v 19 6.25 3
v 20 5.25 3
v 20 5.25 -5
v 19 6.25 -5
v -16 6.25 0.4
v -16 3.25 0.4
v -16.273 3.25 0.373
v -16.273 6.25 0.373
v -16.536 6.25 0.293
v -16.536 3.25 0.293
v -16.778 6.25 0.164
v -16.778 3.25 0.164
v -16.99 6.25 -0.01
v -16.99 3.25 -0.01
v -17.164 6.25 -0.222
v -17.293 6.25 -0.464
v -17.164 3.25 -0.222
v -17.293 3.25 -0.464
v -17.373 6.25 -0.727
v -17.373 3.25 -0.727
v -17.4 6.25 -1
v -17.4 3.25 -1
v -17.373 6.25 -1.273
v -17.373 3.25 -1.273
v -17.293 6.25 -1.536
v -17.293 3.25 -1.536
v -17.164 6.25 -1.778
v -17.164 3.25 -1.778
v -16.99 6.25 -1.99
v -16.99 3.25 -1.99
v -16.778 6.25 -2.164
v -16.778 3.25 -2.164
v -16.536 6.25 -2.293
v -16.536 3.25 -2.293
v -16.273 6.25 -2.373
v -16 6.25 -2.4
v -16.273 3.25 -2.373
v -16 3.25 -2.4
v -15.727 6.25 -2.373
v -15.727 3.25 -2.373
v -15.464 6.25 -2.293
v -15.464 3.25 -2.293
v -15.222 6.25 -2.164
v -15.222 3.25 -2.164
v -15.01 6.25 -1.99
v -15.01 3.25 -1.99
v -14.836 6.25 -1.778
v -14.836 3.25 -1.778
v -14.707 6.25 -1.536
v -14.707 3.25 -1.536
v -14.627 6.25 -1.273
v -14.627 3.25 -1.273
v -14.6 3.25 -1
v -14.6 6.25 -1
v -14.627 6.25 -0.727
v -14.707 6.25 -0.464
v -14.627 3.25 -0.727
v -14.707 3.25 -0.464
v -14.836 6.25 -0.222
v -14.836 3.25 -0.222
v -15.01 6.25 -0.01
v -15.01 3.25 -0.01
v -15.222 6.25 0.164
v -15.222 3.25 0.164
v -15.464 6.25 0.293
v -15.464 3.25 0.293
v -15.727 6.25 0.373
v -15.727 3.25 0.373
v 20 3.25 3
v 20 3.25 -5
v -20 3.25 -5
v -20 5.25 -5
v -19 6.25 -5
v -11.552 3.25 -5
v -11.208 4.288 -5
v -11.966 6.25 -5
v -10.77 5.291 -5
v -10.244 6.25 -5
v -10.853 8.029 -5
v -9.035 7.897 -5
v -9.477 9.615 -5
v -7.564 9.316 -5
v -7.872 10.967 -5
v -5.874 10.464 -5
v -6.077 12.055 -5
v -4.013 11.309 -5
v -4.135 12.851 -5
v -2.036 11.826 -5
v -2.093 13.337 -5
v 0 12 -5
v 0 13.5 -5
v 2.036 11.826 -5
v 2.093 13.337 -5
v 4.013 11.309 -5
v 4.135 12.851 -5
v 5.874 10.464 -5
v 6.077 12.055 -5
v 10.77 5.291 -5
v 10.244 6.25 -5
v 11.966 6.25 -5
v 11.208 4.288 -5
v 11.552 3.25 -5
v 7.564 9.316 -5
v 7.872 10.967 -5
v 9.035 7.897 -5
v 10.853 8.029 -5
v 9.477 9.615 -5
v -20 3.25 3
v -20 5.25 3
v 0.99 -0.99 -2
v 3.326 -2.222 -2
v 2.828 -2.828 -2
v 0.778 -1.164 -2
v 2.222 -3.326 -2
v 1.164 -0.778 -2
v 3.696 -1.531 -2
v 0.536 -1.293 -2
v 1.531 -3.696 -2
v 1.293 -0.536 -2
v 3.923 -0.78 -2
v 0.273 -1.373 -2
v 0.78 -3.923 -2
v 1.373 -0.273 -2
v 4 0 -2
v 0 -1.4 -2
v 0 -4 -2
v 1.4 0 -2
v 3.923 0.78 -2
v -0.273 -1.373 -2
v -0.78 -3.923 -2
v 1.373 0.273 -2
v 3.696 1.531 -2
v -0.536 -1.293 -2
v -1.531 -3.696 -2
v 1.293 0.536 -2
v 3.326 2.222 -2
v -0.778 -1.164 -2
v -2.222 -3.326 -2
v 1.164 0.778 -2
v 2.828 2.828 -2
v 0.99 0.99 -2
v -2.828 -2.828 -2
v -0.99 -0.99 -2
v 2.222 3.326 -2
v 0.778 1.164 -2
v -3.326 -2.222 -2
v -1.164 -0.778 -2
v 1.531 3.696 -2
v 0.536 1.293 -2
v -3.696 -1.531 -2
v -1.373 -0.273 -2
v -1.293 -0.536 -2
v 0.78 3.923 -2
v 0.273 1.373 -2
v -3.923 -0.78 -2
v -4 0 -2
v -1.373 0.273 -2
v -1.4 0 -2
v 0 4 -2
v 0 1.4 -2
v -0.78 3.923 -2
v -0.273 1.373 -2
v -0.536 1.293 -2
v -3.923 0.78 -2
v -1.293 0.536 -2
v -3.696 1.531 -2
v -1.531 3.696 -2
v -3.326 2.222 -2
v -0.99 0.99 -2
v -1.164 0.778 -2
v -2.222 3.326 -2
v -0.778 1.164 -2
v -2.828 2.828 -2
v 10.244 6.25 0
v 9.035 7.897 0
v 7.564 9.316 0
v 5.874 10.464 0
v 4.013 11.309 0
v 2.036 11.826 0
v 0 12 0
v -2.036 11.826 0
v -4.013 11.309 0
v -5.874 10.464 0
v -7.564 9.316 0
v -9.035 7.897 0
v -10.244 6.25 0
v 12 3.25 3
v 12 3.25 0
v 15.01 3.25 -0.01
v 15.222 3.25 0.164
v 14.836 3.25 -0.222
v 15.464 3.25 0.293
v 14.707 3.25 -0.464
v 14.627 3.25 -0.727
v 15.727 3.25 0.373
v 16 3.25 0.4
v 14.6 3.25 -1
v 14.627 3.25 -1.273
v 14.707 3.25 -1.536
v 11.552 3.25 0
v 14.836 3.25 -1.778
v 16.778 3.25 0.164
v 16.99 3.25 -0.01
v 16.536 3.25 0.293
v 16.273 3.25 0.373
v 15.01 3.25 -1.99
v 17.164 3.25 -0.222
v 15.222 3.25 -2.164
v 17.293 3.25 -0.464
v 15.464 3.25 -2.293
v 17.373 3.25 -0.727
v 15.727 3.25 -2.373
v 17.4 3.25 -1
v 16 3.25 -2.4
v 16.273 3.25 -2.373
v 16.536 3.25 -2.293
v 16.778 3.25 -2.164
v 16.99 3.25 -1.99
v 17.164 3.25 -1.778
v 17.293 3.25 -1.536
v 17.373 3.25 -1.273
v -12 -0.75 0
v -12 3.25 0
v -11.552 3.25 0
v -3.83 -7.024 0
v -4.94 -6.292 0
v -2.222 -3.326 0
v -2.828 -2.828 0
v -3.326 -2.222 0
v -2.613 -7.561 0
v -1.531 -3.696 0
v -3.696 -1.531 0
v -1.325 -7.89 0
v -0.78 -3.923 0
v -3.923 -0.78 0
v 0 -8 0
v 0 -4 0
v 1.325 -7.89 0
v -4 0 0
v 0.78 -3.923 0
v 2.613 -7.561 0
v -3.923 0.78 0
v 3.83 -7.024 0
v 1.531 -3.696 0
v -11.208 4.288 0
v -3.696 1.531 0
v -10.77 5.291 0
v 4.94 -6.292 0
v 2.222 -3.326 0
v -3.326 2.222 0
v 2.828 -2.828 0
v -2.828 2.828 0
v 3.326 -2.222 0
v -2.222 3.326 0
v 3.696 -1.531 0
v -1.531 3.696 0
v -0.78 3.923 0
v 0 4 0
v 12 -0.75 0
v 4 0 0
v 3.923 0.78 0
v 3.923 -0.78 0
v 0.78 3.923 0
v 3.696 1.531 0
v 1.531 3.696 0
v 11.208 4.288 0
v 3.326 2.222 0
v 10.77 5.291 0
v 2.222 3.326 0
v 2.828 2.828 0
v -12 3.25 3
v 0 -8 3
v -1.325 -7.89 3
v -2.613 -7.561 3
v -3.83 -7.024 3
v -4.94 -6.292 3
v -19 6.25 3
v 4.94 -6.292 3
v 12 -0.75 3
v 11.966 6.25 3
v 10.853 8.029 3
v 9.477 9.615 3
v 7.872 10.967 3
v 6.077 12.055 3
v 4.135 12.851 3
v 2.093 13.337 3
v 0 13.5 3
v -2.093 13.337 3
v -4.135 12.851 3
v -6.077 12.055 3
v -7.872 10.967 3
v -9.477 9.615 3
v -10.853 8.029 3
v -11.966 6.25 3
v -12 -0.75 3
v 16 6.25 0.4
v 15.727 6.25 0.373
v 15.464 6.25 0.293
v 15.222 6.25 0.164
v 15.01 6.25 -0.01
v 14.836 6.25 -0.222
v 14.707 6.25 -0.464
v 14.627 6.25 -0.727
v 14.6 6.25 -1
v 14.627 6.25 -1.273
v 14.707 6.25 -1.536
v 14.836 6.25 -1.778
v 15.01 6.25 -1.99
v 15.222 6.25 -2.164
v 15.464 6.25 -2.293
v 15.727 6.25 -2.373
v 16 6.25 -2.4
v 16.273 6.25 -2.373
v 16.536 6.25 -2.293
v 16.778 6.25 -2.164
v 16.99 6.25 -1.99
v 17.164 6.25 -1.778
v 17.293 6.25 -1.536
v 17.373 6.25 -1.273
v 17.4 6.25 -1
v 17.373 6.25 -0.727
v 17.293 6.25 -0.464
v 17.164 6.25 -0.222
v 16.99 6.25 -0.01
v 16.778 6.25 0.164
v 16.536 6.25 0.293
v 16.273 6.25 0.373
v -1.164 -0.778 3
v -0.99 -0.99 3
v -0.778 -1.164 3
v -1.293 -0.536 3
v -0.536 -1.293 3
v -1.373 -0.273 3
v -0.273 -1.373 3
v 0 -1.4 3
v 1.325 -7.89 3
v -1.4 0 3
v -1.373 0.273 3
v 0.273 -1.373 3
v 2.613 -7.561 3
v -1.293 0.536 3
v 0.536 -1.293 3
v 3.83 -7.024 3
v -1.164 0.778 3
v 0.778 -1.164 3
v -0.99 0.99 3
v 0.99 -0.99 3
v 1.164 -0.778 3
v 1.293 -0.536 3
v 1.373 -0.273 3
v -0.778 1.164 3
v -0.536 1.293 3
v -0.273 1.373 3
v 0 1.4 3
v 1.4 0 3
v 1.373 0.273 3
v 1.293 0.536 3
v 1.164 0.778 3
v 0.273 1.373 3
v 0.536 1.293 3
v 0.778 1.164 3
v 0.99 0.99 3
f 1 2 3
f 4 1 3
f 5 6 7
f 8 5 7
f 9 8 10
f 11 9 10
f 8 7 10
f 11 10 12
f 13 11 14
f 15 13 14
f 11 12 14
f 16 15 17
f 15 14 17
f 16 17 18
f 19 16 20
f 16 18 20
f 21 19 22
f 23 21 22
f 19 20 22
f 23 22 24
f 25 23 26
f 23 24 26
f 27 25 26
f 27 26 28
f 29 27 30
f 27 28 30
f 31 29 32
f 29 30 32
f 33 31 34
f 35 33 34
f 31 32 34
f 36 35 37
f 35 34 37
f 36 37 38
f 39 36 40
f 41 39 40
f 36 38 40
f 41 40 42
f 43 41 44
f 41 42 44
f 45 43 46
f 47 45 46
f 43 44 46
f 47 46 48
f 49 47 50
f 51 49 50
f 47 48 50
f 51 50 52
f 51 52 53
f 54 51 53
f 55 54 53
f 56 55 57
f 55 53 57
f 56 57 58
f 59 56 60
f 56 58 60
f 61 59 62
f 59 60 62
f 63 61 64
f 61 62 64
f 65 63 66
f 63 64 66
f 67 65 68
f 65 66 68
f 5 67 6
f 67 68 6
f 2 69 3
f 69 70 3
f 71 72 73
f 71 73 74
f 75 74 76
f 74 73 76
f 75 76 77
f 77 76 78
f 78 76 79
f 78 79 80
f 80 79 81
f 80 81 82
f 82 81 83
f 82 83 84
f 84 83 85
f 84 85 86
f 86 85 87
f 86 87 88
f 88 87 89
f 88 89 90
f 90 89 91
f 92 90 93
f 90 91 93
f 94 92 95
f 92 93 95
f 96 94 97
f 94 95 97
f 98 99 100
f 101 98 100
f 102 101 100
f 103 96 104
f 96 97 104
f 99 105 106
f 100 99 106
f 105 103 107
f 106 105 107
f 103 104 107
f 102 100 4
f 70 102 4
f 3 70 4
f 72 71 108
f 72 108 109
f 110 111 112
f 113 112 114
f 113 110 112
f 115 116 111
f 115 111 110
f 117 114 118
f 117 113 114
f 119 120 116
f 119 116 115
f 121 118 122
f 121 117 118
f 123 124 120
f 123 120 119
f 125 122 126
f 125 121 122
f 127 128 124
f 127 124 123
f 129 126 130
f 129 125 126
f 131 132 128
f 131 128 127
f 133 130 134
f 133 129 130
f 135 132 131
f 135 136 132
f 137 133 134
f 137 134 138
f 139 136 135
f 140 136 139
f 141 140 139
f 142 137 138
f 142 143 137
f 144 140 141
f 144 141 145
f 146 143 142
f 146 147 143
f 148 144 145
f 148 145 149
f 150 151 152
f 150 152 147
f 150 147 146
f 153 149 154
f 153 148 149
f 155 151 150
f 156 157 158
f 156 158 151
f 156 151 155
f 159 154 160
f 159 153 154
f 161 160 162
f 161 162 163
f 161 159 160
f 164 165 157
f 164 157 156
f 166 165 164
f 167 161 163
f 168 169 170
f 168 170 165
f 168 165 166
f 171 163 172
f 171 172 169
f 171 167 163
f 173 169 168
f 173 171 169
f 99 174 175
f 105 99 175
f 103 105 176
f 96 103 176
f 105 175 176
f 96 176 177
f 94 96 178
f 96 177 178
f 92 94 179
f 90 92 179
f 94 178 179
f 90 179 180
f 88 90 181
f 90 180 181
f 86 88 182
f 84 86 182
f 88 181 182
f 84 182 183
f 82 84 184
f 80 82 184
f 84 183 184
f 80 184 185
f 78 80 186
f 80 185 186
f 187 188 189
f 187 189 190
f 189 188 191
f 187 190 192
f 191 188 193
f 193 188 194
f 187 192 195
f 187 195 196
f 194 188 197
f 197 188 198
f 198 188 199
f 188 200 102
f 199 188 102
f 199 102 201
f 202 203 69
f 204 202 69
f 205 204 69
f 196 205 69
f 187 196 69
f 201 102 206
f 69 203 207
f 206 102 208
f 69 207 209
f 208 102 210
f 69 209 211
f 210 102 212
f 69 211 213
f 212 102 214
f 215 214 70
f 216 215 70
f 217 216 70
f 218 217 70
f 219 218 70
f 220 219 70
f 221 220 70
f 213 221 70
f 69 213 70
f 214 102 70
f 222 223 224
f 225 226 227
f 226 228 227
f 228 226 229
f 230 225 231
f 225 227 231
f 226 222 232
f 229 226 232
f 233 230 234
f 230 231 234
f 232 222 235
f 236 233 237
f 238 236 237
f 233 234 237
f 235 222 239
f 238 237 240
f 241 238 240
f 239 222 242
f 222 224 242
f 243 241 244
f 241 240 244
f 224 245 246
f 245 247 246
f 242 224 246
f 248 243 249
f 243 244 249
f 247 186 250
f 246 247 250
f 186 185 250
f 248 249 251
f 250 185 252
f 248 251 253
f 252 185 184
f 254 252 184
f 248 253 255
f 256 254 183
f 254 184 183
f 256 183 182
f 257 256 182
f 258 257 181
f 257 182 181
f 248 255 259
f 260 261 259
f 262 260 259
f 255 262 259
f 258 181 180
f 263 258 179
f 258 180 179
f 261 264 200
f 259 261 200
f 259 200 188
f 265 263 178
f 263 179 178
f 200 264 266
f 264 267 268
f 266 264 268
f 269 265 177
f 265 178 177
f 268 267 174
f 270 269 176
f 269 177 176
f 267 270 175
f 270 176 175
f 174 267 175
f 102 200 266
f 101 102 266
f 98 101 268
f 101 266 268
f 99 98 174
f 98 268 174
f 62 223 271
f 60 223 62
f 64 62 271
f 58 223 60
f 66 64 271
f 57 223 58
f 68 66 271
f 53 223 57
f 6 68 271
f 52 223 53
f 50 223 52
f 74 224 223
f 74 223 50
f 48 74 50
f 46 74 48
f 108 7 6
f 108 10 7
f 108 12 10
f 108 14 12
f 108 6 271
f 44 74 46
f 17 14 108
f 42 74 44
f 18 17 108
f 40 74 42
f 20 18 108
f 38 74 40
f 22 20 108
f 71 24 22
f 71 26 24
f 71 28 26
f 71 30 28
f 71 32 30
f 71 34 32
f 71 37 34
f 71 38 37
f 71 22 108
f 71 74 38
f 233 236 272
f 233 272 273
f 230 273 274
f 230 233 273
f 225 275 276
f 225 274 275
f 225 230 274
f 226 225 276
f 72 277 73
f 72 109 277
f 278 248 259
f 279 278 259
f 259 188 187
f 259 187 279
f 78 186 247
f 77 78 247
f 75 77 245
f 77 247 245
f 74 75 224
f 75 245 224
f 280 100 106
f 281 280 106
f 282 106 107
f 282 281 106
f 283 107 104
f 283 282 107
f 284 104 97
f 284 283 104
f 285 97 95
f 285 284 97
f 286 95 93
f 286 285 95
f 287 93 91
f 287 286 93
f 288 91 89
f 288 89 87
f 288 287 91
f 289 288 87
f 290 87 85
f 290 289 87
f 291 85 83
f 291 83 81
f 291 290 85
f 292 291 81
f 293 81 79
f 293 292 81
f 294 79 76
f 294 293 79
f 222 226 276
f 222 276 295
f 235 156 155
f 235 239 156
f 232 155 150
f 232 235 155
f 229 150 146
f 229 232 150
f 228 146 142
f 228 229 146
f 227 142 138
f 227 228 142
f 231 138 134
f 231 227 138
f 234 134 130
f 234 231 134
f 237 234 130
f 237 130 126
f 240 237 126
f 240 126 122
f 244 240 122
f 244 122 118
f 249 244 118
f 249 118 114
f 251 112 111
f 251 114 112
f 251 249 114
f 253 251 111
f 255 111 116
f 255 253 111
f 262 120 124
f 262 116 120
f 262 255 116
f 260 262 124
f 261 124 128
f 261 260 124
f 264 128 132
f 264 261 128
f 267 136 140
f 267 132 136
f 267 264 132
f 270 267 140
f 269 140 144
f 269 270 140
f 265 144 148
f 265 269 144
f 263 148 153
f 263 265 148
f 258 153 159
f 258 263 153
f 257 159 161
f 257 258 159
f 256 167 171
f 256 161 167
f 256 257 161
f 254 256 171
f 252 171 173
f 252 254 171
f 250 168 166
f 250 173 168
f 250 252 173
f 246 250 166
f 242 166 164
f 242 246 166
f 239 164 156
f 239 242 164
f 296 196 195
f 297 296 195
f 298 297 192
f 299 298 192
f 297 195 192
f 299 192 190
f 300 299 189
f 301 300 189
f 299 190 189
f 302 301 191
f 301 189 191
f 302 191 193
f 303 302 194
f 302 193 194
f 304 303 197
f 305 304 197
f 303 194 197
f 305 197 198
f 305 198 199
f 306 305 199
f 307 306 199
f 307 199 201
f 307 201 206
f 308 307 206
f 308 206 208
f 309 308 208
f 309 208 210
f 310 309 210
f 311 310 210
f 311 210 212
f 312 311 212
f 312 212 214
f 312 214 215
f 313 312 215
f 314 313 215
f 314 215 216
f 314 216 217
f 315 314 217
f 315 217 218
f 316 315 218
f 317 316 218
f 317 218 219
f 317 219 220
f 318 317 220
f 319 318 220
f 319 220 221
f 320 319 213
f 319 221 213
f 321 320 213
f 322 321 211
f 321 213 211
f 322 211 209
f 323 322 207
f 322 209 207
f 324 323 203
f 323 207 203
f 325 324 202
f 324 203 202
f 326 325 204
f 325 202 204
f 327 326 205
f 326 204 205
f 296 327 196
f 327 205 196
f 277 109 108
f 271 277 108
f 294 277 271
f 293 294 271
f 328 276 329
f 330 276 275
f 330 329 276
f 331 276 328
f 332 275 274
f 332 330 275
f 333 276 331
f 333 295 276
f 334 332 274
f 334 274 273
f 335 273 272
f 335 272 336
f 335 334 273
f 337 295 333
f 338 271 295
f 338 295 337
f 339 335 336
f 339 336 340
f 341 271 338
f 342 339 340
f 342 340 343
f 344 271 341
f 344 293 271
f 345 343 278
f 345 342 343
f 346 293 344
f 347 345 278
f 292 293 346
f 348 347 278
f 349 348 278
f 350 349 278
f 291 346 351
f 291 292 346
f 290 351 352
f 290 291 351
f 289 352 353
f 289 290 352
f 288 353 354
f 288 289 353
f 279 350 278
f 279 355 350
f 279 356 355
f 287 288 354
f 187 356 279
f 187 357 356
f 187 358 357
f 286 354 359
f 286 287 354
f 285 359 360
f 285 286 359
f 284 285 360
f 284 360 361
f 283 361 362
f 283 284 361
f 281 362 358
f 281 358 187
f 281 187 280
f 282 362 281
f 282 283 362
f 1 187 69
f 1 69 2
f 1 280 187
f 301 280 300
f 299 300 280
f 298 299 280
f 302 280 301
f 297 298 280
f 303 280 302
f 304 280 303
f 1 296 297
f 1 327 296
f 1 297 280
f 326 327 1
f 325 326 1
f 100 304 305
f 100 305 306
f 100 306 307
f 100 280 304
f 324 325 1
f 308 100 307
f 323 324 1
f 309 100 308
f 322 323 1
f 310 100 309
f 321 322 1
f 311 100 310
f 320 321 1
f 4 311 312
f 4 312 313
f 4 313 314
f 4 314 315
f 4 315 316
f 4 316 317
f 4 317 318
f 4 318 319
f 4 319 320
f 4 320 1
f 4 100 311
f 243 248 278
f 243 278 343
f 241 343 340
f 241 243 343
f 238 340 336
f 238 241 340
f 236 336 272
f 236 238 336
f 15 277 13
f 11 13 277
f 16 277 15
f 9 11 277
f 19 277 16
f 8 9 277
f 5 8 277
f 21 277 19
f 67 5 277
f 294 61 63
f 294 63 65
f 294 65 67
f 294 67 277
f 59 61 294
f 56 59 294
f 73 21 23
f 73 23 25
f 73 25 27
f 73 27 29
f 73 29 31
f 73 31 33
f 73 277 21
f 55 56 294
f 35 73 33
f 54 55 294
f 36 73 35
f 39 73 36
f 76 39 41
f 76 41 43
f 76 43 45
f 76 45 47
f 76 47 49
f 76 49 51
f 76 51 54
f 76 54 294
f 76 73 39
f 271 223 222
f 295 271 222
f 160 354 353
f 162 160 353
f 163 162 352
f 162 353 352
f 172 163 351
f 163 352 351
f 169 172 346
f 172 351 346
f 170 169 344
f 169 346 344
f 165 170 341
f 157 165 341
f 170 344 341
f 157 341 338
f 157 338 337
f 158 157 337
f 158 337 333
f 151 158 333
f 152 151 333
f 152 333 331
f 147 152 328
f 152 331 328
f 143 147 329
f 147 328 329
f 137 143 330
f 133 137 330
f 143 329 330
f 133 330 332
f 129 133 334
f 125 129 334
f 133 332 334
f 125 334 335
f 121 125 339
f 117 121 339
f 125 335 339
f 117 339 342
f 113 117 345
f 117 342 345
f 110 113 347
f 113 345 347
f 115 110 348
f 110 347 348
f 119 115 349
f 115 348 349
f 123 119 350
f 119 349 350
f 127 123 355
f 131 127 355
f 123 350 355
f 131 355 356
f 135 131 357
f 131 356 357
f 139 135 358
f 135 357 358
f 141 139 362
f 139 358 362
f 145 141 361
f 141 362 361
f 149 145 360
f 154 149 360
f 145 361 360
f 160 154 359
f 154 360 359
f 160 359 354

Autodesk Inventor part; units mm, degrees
ref_plane "YZ Plane" through (0, 0, 0) normal (1, 0, 0) x (0, 1, 0)
ref_plane "XZ Plane" through (0, 0, 0) normal (0, 1, 0) x (-1, 0, 0)
ref_plane "XY Plane" through (0, 0, 0) normal (0, 0, 1) x (1, 0, 0)
sketch "Эскиз1" plane through (0, 0, 0) normal (0, 0, 1) x (1, 0, 0)
  circle A0 centre (0, 0) radius 10.75 construction
  line L0 (-40.1576, -0.75) -> (35.328, -0.75) construction
  line L1 (-40.1576, 3.25) -> (35.328, 3.25) construction
  line L2 (-12, 3.25) -> (-20, 3.25)
  line L3 (-20, 3.25) -> (-20, 6.25)
  line L4 (-20, 6.25) -> (0, 6.25)
  line L5 (0, 6.25) -> (0, -8)
  arc A1 (-4.9401, -6.2925) -> (0, -8) centre (0, 0) ccw
  line L6 (12, 3.25) -> (20, 3.25)
  line L7 (20, 3.25) -> (20, 6.25)
  line L8 (20, 6.25) -> (0, 6.25)
  arc A2 (0, -8) -> (4.9401, -6.2925) centre (0, 0) ccw
  line L9 (12, 3.25) -> (12, -0.75)
  line L10 (-12, 3.25) -> (-12, -0.75)
  line L11 (-4.9401, -6.2925) -> (-12, -0.75)
  line L12 (4.9401, -6.2925) -> (12, -0.75)
  dimension "d1" = 21.5
  dimension "d2" = 0.75
  dimension "d3" = 4
  dimension "d4" = 8
  dimension "d5" = 3
  dimension "d6" = 24
  dimension "d7" = 40
extrude "Выдавливание1" add sketch "Эскиз1" along normal blind 3
sketch "Эскиз2" plane through (0, 0, 0) normal (0, 0, -1) x (-1, 0, 0)
  arc A0 (-4.9401, -6.2925) -> (4.9401, -6.2925) centre (0, 0) ccw projected
  circle A1 centre (0, 0) radius 4
  line L0 (-20, 6.25) -> (20, 6.25) projected
  line L1 (-12, 3.25) -> (-20, 3.25) projected
  line L2 (-20, 3.25) -> (-20, 6.25) projected
  line L3 (-11.5515, 3.25) -> (-20, 3.25)
  line L4 (-20, 3.25) -> (-20, 6.25)
  line L5 (-20, 6.25) -> (-10.2439, 6.25)
  line L6 (10.2439, 6.25) -> (20, 6.25)
  line L7 (20, 6.25) -> (20, 3.25) projected
  line L8 (20, 6.25) -> (20, 3.25)
  line L9 (20, 3.25) -> (11.5515, 3.25)
  arc A2 (-10.2439, 6.25) -> (-11.5515, 3.25) centre (0, 0) ccw
  arc A3 (11.5515, 3.25) -> (10.2439, 6.25) centre (0, 0) ccw
  line L10 (-20, 6.25) -> (20, 6.25) projected
  dimension "d10" = 8
  dimension "d26" = 12
extrude "Выдавливание2" add sketch "Эскиз2" along normal blind 2
sketch "Эскиз3" plane through (0, 0, -2) normal (0, 0, -1) x (-1, 0, 0)
  line L0 (-10.2439, 6.25) -> (-20, 6.25) projected
  line L1 (-20, 6.25) -> (-20, 3.25) projected
  line L2 (-20, 3.25) -> (-11.5515, 3.25) projected
  line L3 (11.5515, 3.25) -> (20, 3.25) projected
  line L4 (20, 3.25) -> (20, 6.25) projected
  arc A0 (11.5515, 3.25) -> (10.2439, 6.25) centre (0, 0) ccw projected
  line L5 (20, 6.25) -> (10.2439, 6.25) projected
  arc A1 (-10.2439, 6.25) -> (-11.5515, 3.25) centre (0, 0) ccw projected
extrude "Выдавливание3" add sketch "Эскиз3" along normal blind 3
sketch "Эскиз4" plane through (0, 0, -2) normal (0, 0, -1) x (-1, 0, 0)
  circle A0 centre (0, 0) radius 4 projected
hole "Отверстие1" at (0, 0, -2) direction (0, 0, 1) diameter 2.8 end through all
sketch "Эскиз5" plane through (0, 0, 3) normal (0, 0, 1) x (1, 0, 0)
  arc A0 (10.2439, 6.25) -> (-10.2439, 6.25) centre (0, 0) ccw
  line L0 (20, 6.25) -> (-20, 6.25) projected
  arc A1 (11.9661, 6.25) -> (-11.9661, 6.25) centre (0, 0) ccw
  line L1 (11.9661, 6.25) -> (10.2439, 6.25)
  line L2 (-10.2439, 6.25) -> (-11.9661, 6.25)
  dimension "d22" = 12
  dimension "d23" = 1.5
extrude "Выдавливание4" add sketch "Эскиз5" against normal up to surface (8 mm away) contours A0 L0 A1
sketch "Эскиз6" plane through (0, 0, 3) normal (0, 0, 1) x (1, 0, 0)
  arc A0 (10.2439, 6.25) -> (-10.2439, 6.25) centre (0, 0) ccw projected
  line L0 (10.2439, 6.25) -> (-10.2439, 6.25) projected
extrude "Выдавливание5" add sketch "Эскиз6" against normal up to surface (3 mm away)
sketch "Эскиз7" plane through (20, 6.25, 3) normal (0, 1, 0) x (1, 0, 0)
  line L0 (-40, 8) -> (-40, 0) projected
  line L1 (-31.5515, 8) -> (-8.4485, 8) projected
  line L2 (-20, 8) -> (-20, 0)
  line L3 (-24.9401, 0) -> (-15.0599, 0) projected
  point P0 (-20, 3)
  point P1 (-4, 4)
  point P2 (-36, 4)
  point P3 (-40, 4)
  dimension "d36" = 32
hole "Отверстие2" at (16, 6.25, -1) at (-16, 6.25, -1) direction (0, -1, 0) diameter 2.8 end through all
chamfer "Фаска1" distance 1 angle 45 2 edges at (20, 6.25, -1) (-20, 6.25, -1)
properties part number "smallWheelStator" material "Пластик АБС"
